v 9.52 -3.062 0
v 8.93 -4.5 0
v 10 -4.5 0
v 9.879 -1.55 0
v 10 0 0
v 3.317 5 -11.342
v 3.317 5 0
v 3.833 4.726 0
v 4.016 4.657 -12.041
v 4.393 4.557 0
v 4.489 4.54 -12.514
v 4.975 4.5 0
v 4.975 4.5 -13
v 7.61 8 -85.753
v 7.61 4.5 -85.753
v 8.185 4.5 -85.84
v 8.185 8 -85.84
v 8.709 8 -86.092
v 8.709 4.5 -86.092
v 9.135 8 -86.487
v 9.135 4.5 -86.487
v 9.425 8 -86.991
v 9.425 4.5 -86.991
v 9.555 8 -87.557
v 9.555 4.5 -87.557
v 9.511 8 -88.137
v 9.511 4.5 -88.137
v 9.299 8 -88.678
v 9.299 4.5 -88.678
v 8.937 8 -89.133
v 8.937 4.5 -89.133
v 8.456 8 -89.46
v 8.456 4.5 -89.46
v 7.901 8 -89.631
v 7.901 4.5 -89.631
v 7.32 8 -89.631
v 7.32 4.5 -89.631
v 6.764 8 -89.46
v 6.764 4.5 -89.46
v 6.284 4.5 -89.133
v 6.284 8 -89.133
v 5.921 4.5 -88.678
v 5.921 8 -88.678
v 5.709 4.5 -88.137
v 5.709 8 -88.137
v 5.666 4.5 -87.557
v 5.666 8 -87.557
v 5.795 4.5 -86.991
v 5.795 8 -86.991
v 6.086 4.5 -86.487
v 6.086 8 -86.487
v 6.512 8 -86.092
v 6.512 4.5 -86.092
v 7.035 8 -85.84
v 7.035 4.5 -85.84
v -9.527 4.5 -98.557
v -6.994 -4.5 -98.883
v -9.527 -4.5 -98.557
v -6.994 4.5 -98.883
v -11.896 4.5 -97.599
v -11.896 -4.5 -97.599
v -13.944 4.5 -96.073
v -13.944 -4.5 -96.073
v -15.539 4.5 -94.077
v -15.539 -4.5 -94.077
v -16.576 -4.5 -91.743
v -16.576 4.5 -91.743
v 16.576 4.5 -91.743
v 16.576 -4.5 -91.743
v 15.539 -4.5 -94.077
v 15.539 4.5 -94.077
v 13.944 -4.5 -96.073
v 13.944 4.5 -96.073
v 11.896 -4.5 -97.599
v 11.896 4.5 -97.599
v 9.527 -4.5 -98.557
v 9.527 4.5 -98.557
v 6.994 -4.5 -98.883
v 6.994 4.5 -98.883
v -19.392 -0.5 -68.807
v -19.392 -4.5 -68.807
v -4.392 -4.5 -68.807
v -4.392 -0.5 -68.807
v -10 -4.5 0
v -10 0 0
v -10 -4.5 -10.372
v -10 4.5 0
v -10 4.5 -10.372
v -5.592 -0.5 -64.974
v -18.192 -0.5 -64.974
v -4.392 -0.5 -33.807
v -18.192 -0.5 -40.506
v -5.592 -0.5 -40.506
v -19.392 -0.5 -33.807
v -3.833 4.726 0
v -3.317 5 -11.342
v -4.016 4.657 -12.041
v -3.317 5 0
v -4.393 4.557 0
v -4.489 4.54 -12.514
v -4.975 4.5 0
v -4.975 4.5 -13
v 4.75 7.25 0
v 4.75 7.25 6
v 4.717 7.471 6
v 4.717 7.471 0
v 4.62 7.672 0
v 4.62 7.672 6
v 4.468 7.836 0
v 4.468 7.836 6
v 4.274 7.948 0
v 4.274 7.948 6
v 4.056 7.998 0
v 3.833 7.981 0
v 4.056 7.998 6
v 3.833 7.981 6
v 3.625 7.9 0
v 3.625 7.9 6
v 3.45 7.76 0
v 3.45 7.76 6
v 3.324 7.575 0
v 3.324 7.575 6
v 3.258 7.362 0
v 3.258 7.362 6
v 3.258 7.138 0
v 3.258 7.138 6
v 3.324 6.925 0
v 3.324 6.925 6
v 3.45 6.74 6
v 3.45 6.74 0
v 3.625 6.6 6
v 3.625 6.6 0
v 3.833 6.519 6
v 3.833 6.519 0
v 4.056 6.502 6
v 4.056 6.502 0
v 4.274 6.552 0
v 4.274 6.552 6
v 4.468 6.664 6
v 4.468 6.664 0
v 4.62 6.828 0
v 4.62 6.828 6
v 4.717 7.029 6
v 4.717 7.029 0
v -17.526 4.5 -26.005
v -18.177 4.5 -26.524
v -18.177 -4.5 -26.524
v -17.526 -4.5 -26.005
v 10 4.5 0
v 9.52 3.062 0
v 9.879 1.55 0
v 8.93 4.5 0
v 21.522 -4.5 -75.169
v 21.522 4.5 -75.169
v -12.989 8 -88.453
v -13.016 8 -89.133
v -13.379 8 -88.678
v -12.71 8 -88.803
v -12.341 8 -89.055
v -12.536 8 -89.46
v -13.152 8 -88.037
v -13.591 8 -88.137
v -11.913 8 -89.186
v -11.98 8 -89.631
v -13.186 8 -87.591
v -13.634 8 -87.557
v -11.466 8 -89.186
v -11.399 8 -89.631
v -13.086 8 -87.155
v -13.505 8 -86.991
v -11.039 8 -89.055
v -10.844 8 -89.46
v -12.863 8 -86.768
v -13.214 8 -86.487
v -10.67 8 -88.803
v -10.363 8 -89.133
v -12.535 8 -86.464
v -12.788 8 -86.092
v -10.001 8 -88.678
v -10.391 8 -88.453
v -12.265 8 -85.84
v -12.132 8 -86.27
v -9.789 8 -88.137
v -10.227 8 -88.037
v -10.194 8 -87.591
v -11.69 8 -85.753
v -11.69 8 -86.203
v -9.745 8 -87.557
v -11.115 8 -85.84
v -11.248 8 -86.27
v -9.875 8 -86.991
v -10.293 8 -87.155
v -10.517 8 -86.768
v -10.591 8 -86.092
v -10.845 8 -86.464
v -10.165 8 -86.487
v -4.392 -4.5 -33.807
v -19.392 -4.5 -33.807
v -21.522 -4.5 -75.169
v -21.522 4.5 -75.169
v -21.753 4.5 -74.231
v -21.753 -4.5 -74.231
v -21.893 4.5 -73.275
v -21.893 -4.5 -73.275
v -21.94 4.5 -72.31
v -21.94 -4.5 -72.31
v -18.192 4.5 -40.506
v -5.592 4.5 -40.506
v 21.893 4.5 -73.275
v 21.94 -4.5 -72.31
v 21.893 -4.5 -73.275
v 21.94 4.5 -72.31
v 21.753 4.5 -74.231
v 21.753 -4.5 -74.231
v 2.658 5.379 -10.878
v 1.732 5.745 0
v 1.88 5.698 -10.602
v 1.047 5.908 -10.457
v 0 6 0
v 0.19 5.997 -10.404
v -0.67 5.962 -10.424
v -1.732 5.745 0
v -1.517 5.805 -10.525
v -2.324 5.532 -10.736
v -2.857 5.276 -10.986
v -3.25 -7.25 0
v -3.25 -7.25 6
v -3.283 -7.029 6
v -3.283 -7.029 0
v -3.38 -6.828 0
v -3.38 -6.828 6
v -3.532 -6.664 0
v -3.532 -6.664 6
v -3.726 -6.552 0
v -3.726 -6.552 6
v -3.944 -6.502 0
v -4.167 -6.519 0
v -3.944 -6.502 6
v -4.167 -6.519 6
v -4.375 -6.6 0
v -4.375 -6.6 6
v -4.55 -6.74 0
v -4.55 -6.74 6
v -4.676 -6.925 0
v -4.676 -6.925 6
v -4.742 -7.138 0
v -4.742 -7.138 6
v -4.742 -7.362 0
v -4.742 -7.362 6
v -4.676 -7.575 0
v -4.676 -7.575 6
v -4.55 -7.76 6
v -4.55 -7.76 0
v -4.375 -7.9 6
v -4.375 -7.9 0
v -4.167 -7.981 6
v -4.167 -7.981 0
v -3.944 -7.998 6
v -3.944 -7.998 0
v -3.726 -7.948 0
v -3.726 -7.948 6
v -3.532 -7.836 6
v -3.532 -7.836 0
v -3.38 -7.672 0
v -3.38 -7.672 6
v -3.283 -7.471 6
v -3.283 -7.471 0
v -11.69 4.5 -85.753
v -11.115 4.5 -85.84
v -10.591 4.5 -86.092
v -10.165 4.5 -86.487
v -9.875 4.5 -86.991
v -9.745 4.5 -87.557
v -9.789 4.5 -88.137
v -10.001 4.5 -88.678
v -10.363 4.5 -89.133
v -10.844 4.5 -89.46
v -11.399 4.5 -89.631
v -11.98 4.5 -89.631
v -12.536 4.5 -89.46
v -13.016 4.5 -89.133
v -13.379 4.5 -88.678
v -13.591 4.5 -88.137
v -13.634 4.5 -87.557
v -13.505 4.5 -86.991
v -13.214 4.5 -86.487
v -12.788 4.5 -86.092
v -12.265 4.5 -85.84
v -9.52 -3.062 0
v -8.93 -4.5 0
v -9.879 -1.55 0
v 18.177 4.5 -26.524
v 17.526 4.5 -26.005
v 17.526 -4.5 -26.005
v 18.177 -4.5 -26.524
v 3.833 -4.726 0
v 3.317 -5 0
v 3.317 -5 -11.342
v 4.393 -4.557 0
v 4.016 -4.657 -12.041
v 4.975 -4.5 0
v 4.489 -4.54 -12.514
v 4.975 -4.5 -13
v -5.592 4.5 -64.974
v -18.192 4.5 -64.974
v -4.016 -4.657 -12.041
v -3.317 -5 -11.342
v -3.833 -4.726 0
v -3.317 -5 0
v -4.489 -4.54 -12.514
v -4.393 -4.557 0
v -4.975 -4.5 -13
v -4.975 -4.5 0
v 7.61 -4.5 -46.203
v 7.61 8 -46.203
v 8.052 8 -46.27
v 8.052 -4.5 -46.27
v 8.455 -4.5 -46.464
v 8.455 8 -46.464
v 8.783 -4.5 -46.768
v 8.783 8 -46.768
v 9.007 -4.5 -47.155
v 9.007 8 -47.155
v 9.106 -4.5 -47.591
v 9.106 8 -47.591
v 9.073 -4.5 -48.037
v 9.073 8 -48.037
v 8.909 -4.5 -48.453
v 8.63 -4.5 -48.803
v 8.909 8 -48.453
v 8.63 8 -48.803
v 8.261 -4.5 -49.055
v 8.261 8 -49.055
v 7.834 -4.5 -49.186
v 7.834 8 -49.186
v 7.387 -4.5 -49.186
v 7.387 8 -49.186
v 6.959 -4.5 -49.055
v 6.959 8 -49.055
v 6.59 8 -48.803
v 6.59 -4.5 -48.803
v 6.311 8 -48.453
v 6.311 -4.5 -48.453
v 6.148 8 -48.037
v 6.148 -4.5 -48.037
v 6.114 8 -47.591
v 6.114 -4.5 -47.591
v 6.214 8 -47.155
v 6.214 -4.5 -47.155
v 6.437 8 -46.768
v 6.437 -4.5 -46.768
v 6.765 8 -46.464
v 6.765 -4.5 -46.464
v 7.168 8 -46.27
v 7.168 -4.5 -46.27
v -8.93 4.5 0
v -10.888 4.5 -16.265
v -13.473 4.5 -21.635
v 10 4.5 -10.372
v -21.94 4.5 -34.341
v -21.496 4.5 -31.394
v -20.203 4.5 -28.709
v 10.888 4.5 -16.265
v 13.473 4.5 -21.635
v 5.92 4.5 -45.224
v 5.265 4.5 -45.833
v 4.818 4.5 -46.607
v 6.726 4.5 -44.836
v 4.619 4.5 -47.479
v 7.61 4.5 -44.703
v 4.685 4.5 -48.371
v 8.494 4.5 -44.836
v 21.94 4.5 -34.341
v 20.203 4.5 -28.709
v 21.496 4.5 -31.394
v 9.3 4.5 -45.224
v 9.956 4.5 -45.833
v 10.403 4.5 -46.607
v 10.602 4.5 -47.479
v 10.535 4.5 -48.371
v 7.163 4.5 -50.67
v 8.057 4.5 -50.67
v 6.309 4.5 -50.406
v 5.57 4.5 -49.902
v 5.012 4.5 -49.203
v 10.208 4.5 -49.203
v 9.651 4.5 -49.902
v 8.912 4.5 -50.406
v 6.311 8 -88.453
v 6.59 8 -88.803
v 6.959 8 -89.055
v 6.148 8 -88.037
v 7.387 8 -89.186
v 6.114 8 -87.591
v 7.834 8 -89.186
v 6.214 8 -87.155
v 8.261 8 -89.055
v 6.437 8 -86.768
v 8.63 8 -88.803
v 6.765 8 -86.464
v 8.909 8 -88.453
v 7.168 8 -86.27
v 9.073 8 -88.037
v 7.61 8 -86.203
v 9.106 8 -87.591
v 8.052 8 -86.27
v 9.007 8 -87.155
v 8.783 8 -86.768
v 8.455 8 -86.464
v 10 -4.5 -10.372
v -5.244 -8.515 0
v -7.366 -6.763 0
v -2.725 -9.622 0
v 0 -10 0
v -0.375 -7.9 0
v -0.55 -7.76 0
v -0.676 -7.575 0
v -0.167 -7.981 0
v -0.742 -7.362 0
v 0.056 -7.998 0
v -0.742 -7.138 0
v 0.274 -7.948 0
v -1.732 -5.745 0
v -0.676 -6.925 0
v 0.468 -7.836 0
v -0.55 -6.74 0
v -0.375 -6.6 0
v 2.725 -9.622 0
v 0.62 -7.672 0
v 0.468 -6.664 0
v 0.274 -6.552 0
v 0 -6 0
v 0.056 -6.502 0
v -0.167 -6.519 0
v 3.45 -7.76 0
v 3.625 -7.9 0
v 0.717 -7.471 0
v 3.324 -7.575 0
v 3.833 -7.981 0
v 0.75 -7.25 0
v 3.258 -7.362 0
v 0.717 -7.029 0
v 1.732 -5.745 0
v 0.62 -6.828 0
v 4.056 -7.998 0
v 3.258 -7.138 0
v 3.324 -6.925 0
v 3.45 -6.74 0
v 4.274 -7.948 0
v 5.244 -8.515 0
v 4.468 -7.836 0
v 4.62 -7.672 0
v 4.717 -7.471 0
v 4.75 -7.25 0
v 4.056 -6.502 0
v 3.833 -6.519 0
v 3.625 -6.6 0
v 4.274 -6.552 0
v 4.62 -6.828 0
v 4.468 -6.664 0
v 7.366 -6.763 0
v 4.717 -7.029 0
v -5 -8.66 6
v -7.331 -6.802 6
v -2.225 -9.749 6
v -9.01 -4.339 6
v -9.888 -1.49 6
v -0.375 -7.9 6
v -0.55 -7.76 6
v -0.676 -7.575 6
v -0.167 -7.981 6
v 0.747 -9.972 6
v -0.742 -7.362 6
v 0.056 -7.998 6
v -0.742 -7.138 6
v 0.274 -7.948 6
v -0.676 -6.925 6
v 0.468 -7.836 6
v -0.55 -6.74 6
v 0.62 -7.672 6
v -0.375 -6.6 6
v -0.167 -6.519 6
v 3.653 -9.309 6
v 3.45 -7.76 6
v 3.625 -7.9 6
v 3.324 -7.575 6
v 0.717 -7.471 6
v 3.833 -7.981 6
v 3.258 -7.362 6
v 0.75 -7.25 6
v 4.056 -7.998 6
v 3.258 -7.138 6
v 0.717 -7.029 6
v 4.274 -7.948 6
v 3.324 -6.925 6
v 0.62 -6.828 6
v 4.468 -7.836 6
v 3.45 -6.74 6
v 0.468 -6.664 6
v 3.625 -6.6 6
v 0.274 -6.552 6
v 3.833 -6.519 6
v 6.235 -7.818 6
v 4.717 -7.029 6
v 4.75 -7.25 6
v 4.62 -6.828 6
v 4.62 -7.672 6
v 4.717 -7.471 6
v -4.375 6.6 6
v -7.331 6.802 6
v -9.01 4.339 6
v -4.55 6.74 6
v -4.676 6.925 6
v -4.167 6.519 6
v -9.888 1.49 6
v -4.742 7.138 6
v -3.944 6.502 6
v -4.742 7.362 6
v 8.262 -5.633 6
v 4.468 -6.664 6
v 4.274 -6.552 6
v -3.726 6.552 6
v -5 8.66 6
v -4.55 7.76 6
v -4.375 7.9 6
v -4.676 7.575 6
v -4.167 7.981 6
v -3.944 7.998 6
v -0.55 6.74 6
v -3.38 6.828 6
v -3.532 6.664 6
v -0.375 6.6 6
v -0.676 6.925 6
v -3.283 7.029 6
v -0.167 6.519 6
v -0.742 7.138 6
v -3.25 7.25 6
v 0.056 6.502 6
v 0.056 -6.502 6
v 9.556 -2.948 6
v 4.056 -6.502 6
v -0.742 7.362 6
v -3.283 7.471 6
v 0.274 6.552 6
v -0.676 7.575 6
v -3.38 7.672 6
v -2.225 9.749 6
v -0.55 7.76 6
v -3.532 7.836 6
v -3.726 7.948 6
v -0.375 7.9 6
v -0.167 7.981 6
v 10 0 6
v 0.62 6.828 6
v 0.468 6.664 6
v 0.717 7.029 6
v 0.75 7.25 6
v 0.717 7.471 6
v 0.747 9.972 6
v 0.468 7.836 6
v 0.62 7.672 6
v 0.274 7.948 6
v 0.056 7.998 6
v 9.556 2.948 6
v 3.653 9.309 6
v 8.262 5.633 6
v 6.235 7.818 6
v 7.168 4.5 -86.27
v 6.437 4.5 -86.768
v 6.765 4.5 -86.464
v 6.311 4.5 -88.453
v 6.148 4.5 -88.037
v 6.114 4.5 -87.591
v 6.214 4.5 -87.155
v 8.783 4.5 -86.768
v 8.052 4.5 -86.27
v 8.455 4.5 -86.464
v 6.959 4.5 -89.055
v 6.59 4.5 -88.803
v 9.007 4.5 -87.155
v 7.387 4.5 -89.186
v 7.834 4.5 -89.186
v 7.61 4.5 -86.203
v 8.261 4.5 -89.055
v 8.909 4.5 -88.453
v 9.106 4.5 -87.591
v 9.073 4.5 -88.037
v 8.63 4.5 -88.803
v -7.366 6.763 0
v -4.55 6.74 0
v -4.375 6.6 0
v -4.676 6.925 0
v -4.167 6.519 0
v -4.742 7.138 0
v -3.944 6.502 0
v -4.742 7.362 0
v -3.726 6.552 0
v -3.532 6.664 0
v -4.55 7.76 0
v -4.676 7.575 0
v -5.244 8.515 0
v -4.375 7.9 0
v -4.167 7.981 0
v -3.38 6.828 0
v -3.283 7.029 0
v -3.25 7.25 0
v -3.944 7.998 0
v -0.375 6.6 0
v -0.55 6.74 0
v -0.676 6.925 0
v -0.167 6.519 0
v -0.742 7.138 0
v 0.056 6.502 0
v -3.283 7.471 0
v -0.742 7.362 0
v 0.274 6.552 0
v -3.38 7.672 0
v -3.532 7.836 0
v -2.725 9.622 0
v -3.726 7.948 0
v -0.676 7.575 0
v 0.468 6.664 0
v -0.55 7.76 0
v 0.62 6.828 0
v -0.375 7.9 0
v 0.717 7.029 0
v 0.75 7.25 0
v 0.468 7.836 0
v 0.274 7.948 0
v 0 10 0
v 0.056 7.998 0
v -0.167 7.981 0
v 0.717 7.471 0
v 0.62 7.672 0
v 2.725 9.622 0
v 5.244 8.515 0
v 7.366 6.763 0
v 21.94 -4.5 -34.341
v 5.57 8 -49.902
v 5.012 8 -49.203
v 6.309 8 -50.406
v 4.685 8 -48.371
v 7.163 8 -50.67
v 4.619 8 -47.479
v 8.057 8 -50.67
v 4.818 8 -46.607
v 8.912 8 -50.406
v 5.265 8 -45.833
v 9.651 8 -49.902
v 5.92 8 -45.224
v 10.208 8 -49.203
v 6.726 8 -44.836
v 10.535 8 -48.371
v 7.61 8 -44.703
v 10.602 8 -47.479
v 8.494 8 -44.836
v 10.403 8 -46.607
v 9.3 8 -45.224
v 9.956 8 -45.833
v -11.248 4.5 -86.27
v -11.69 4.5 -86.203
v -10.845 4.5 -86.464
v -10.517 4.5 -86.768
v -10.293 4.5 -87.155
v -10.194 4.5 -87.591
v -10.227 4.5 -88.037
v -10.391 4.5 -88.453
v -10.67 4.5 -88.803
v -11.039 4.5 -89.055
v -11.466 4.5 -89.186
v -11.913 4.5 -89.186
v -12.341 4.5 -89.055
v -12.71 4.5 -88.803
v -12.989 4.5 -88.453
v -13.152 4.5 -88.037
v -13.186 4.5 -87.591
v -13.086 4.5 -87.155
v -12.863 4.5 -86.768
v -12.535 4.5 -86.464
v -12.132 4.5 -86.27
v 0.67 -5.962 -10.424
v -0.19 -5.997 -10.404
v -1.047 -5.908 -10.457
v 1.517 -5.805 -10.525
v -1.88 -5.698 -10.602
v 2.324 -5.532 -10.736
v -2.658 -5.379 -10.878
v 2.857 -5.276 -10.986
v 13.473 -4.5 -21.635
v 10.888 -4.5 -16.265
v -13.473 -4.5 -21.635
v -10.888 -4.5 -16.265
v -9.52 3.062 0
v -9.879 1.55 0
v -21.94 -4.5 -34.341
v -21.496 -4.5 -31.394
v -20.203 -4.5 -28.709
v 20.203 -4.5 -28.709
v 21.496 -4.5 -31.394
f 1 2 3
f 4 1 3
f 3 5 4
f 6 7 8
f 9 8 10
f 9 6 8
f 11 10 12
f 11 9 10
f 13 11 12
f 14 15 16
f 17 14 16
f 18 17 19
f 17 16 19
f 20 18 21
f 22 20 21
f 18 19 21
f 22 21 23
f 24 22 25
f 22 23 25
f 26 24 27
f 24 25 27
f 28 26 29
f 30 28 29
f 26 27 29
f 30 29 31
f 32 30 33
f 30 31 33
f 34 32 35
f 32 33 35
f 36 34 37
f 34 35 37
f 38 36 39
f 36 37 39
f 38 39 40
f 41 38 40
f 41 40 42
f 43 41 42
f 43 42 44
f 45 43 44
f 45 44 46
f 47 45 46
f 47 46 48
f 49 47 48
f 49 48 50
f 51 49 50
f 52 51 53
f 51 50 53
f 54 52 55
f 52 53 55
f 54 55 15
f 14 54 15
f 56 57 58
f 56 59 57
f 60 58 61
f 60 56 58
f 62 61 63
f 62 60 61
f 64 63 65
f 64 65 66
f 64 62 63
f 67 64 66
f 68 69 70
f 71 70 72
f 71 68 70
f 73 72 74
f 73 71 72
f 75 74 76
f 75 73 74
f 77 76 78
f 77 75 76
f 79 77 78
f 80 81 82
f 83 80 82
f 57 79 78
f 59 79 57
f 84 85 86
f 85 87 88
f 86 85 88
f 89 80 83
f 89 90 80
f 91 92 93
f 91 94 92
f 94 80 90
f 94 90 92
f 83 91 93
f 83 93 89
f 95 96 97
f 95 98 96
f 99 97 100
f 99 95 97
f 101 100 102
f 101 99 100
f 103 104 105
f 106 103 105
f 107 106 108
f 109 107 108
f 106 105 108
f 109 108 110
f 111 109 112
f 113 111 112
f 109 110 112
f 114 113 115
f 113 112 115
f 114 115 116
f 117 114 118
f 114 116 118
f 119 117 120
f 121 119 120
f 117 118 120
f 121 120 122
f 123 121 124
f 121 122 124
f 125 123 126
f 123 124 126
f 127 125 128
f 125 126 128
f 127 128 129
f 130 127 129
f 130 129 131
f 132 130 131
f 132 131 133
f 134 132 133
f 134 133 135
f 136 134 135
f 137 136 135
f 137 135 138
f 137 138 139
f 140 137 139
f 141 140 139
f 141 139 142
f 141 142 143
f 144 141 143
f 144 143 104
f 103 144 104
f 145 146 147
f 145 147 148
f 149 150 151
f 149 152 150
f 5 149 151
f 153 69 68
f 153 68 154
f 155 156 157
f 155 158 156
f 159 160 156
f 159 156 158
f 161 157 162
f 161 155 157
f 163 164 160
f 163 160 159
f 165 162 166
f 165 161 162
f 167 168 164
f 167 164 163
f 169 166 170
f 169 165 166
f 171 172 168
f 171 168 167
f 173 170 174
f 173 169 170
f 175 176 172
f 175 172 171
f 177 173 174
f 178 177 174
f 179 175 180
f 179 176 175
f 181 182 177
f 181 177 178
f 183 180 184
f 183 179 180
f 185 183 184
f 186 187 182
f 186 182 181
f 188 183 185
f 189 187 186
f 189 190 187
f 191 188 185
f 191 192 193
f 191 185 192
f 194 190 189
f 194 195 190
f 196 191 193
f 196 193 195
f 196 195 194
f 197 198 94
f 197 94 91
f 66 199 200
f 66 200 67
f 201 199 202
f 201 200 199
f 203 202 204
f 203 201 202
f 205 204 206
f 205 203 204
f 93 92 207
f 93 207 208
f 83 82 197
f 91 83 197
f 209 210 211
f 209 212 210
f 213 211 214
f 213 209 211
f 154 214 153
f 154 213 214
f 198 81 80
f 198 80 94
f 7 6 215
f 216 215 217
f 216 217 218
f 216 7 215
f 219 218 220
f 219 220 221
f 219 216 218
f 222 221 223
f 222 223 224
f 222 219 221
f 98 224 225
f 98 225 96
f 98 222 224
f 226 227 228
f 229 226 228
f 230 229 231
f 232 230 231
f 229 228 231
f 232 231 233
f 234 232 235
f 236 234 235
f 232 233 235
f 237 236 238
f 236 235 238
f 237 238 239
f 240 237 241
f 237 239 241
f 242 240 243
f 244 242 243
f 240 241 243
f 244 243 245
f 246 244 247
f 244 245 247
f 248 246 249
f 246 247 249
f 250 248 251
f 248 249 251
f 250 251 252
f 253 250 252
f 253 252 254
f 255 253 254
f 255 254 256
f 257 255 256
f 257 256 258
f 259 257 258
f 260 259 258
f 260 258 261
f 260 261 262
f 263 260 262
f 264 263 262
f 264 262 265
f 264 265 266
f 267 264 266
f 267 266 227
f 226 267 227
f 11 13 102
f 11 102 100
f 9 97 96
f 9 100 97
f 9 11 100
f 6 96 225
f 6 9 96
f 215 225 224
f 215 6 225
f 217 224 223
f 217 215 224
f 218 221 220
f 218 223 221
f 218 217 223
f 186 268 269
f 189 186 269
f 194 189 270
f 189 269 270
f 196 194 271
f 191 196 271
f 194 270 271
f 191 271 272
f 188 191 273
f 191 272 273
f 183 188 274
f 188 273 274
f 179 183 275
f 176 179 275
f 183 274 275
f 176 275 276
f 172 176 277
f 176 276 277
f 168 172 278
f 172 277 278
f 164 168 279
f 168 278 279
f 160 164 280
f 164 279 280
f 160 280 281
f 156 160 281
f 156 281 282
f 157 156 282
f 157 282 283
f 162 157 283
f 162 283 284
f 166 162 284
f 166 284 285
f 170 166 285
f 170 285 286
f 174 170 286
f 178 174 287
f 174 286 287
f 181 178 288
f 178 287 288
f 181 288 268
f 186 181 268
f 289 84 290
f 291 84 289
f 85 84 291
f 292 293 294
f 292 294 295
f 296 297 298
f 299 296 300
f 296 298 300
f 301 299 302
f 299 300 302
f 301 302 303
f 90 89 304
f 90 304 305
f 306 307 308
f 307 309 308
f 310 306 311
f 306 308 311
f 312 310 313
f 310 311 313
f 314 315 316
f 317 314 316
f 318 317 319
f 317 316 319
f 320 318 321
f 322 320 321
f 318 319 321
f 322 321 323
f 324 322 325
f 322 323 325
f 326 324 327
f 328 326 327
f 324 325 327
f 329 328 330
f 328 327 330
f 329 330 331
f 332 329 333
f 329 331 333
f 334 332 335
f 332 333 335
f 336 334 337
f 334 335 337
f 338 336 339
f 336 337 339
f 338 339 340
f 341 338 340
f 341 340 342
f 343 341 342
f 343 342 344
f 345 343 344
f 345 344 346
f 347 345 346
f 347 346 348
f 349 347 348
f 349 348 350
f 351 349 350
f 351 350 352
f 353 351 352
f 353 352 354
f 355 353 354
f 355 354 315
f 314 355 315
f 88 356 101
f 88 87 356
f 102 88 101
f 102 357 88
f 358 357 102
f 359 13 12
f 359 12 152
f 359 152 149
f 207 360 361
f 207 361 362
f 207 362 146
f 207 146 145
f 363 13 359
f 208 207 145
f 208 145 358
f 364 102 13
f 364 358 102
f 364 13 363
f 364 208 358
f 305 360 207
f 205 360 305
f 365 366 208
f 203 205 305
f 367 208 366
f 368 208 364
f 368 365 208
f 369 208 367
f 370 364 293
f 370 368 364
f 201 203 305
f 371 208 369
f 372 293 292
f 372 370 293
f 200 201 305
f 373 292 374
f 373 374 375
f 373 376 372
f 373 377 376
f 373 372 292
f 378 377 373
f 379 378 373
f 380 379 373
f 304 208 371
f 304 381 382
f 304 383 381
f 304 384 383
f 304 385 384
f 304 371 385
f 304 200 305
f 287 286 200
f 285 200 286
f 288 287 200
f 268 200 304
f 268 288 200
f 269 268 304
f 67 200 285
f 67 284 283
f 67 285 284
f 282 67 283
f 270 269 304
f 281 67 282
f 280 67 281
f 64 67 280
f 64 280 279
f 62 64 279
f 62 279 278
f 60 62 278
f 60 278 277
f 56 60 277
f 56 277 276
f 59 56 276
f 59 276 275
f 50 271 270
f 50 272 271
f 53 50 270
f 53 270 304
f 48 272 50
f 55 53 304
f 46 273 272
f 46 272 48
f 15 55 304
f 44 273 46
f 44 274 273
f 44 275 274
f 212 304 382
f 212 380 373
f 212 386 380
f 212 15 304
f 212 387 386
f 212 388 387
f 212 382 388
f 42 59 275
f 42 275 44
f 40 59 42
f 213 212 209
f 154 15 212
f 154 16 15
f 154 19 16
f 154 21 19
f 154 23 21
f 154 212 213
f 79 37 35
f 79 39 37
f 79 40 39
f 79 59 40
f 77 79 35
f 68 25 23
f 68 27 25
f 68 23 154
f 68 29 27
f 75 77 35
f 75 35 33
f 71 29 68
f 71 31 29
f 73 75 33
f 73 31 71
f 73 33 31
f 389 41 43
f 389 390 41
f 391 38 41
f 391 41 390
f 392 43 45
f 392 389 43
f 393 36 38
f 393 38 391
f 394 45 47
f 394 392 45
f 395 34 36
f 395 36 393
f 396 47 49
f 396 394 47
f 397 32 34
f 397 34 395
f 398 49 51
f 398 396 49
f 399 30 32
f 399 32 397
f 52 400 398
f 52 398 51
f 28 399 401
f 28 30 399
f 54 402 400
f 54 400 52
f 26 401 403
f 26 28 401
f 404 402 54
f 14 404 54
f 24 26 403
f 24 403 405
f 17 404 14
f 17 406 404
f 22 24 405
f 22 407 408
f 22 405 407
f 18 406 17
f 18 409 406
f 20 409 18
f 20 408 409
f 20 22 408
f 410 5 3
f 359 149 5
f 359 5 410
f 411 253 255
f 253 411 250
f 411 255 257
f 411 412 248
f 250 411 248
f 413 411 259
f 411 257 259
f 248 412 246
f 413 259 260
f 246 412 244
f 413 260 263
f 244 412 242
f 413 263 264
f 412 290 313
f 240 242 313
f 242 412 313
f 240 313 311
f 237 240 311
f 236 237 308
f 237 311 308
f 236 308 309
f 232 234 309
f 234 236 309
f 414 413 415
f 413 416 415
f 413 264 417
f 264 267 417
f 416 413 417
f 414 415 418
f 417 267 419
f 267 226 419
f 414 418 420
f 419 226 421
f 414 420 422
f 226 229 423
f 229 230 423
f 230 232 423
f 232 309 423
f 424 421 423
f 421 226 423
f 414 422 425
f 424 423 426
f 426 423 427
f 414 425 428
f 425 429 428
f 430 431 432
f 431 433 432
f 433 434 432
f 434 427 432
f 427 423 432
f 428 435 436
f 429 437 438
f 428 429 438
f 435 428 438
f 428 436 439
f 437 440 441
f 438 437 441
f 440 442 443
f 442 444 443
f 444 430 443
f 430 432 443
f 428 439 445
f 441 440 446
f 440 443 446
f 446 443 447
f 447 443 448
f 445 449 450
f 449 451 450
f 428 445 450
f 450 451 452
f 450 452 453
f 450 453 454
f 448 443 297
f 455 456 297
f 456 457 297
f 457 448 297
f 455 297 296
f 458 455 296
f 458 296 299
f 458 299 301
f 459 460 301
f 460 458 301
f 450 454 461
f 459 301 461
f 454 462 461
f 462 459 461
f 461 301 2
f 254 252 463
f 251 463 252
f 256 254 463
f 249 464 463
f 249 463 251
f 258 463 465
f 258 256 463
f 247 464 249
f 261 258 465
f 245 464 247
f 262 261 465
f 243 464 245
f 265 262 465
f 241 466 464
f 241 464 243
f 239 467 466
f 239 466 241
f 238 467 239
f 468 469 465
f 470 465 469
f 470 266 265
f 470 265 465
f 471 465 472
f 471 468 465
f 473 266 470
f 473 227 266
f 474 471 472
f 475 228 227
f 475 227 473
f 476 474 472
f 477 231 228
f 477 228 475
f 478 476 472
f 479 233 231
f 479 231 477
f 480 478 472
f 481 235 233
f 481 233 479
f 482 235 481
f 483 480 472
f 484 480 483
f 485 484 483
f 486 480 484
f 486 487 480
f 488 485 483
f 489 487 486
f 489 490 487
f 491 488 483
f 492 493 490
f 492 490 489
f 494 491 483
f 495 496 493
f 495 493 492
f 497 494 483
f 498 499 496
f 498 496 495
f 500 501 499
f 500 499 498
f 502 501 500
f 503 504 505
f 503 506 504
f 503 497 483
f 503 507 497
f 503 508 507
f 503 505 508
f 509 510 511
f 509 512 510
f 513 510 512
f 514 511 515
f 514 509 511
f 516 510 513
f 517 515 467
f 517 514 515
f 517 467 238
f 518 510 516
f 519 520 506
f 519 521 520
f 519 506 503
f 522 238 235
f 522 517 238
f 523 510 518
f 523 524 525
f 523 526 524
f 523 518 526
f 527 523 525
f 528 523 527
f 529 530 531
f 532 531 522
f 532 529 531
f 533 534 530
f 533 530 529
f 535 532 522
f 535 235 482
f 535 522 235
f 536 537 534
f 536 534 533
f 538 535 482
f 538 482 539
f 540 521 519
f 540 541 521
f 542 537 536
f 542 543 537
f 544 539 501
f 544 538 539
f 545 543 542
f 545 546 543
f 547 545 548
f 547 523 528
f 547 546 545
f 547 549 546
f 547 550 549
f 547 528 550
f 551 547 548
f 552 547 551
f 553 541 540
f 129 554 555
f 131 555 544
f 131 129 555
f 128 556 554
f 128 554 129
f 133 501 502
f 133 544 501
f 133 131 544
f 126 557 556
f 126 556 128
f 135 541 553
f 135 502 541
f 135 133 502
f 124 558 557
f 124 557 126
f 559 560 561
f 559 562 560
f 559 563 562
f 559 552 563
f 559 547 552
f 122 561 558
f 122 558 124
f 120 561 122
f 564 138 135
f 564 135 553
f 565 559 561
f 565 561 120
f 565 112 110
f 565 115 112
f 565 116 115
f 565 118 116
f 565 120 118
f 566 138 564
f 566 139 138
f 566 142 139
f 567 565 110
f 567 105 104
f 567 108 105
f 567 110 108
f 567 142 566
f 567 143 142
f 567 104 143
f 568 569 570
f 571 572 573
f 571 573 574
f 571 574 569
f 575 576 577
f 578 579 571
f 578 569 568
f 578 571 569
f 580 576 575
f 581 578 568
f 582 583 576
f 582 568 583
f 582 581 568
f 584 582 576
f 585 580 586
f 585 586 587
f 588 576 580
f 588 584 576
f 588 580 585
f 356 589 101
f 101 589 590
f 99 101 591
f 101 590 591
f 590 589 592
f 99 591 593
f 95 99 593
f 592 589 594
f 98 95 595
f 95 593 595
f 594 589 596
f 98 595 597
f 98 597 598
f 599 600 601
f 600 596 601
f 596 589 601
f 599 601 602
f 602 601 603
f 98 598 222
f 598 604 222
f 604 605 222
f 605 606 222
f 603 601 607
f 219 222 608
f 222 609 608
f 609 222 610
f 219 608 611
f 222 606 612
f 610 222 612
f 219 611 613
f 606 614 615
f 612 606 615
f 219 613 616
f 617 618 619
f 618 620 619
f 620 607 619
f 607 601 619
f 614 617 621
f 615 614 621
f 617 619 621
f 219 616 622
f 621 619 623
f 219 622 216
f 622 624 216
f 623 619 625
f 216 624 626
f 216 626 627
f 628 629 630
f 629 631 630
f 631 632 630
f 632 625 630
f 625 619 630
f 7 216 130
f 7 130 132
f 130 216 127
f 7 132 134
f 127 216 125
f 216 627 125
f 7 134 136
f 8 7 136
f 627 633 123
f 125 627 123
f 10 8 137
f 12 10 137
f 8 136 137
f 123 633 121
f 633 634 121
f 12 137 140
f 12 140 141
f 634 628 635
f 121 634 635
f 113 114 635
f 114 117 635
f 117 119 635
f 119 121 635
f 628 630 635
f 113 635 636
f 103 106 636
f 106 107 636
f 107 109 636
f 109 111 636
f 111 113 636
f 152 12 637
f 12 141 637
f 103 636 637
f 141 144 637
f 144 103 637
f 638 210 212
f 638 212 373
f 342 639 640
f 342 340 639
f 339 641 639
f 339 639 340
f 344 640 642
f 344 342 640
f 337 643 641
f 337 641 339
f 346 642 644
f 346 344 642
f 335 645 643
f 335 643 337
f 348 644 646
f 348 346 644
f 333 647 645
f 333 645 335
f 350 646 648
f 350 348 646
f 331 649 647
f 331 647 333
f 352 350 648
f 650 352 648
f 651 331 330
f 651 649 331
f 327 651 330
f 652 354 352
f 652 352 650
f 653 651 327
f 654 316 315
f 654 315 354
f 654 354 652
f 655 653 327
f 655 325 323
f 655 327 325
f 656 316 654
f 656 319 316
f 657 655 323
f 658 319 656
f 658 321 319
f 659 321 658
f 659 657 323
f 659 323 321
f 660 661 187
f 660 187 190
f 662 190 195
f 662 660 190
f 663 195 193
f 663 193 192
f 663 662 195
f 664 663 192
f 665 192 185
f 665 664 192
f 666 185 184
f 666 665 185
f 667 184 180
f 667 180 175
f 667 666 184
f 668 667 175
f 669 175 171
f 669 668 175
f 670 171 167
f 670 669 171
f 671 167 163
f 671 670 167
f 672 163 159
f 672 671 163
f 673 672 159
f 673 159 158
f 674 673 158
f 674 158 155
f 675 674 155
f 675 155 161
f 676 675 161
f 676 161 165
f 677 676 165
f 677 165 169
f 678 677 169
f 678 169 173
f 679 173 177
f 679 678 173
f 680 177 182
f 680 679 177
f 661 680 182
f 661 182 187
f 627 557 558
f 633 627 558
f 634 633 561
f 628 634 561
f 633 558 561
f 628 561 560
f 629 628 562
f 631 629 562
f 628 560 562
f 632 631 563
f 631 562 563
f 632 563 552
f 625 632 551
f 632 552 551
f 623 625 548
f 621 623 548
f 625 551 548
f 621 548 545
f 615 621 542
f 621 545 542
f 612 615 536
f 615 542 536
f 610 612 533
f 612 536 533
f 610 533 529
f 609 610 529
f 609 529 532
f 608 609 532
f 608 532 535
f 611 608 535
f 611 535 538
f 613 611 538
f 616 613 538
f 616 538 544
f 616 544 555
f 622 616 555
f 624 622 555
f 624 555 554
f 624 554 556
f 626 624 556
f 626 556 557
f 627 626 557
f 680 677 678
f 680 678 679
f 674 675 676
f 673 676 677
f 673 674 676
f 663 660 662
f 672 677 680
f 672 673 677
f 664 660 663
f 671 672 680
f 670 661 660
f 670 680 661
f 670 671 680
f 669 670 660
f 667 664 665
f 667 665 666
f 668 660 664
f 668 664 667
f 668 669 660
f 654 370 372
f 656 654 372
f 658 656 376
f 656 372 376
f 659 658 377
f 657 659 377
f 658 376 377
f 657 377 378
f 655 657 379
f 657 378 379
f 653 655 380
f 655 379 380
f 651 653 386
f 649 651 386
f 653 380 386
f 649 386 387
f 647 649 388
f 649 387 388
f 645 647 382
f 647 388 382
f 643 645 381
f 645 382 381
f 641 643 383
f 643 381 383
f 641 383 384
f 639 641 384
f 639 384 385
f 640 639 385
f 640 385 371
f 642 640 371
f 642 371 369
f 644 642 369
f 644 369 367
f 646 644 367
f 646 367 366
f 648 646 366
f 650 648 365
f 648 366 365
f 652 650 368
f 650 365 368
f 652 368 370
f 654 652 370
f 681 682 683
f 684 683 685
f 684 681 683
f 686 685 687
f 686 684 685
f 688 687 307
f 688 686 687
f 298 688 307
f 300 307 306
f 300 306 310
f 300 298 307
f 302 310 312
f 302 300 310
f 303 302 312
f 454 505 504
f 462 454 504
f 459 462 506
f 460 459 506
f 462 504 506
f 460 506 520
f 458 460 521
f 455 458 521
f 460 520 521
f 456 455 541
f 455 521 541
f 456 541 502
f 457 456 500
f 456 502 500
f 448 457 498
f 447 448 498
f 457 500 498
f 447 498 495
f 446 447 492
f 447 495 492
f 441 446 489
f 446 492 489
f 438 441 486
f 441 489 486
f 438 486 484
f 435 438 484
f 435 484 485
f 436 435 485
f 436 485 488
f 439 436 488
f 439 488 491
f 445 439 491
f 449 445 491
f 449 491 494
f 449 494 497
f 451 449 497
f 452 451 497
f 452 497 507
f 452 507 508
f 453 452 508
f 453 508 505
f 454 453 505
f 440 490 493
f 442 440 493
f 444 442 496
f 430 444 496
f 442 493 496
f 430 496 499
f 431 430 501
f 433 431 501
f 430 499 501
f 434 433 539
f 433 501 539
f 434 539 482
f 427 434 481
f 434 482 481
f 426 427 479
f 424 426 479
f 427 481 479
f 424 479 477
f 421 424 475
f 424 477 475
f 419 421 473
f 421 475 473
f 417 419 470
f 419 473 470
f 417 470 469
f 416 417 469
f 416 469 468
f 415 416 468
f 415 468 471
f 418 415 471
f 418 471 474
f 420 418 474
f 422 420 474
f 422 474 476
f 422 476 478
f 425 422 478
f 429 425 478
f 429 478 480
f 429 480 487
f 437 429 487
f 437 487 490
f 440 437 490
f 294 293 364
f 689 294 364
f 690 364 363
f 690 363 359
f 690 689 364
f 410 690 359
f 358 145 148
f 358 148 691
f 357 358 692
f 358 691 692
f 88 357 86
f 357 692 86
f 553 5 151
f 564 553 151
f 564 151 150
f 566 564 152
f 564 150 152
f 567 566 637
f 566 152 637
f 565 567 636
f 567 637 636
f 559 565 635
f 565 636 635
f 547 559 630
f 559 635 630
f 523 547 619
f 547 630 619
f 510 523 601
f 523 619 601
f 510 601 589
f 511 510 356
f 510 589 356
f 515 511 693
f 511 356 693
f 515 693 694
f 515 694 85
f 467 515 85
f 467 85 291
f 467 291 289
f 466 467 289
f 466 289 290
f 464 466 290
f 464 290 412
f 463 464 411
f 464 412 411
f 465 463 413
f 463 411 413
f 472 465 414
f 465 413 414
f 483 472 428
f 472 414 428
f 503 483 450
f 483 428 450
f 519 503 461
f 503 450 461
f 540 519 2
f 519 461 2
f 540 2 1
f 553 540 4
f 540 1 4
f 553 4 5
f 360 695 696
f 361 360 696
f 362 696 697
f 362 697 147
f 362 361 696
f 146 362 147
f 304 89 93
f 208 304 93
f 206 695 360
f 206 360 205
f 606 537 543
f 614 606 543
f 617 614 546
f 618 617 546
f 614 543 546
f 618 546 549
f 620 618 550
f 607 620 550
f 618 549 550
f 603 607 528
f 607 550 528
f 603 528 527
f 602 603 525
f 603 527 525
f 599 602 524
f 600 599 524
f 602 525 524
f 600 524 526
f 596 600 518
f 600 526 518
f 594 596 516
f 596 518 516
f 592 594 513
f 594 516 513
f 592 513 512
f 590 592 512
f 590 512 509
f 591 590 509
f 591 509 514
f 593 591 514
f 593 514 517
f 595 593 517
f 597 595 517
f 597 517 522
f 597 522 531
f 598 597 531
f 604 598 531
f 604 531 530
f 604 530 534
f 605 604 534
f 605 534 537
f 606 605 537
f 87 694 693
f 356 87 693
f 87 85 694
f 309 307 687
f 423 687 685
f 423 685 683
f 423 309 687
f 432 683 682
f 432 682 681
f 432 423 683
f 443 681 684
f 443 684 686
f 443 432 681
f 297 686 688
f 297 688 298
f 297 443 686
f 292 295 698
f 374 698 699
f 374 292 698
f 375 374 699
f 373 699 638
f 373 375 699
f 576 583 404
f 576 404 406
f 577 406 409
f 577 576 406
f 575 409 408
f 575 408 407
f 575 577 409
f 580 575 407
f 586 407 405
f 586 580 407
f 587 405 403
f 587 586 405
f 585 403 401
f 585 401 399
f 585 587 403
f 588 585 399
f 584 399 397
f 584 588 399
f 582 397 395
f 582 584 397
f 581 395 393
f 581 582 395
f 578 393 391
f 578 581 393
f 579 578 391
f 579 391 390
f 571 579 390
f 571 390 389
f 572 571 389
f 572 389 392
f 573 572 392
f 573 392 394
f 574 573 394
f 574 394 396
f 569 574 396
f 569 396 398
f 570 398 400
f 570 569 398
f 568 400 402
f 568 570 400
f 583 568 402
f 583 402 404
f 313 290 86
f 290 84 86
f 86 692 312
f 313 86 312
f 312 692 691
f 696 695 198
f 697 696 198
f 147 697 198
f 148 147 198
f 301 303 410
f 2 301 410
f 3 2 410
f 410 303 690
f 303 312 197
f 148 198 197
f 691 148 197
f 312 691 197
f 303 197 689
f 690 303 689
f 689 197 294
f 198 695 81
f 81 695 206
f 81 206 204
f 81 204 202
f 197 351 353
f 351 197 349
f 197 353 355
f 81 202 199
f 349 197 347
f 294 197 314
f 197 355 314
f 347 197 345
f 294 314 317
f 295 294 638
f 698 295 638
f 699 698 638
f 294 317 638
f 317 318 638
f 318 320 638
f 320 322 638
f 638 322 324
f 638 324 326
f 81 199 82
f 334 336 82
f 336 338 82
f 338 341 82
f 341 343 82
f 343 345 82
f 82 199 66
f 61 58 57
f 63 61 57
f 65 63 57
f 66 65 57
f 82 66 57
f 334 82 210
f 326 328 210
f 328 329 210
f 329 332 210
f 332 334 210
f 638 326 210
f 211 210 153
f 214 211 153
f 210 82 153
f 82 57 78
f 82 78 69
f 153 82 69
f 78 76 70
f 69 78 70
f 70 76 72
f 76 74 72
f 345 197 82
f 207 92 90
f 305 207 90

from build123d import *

# Parameters (mm, degrees)
SKETCH1_R           = 10
BOSS_EXTRUDE1_DEPTH = 6
SKETCH2_R           = 0.75
CUT_EXTRUDE1_DEPTH  = 15
SKETCH4_R           = 6
BOSS_EXTRUDE3_DEPTH = 10
SKETCH5_W           = 20
SKETCH5_H           = 20
BOSS_EXTRUDE4_DEPTH = 4.5
BOSS_EXTRUDE5_DEPTH = 9
SKETCH7_W           = 15
SKETCH7_H           = 35
CUT_EXTRUDE2_DEPTH  = 4
CUT_EXTRUDE3_DEPTH  = 14
CUT_EXTRUDE4_DEPTH  = 10
SKETCH11_R          = 1.95
SKETCH11_R_2        = 1.5
BOSS_EXTRUDE6_DEPTH = 3.5
SKETCH12_R          = 3
BOSS_EXTRUDE7_DEPTH = 3.5
SKETCH13_R          = 1.5
CUT_EXTRUDE5_DEPTH  = 25
FILLET1_R           = 20
FILLET2_R           = 10
FILLET3_R           = 3
FILLET4_R           = 3
FILLET5_R           = 3
FILLET6_R           = 3


with BuildPart() as part:
    # Sketch1 → Boss-Extrude1 (new body)
    with BuildSketch(Plane.XY):
        Circle(SKETCH1_R)
    extrude(amount=BOSS_EXTRUDE1_DEPTH)

    # Sketch2 → Cut-Extrude1 (cut)
    with BuildSketch(Plane.XY.offset(6)):
        with Locations((0, 7.25)):
            Circle(SKETCH2_R)
        with Locations((4, 7.25)):
            Circle(SKETCH2_R)
        with Locations((-4, 7.25)):
            Circle(SKETCH2_R)
        with Locations((4, -7.25)):
            Circle(SKETCH2_R)
        with Locations((0, -7.25)):
            Circle(SKETCH2_R)
        with Locations((-4, -7.25)):
            Circle(SKETCH2_R)
    extrude(amount=-CUT_EXTRUDE1_DEPTH, mode=Mode.SUBTRACT)

    # Sketch4 → Boss-Extrude3 (add)
    with BuildSketch(Plane(origin=(0, 0, 0), x_dir=(-1, 0, 0), z_dir=(0, 0, -1))):
        Circle(SKETCH4_R)
    extrude(amount=BOSS_EXTRUDE3_DEPTH)

    # Sketch5 → Boss-Extrude4 (add, symmetric)
    with BuildSketch(Plane(origin=(0, 0, 0), x_dir=(1, 0, 0), z_dir=(0, 1, 0))):
        with Locations((0, 10)):
            Rectangle(SKETCH5_W, SKETCH5_H)
    extrude(amount=BOSS_EXTRUDE4_DEPTH, both=True)

    # Sketch6 → Boss-Extrude5 (add)
    with BuildSketch(Plane(origin=(0, 4.5, 0), x_dir=(1, 0, 0), z_dir=(0, 1, 0))):
        Polygon((10, 20), (35.763212592, 40.556396064), (35.763212592, 98.883063355), (-35.763212592, 98.883063355), (-35.763212592, 40.556396064), (-10, 20), align=None)
    extrude(amount=-BOSS_EXTRUDE5_DEPTH)

    # Sketch7 → Cut-Extrude2 (cut)
    with BuildSketch(Plane.XZ.offset(4.5)):
        with Locations((-11.892304399, -51.30711123)):
            Rectangle(SKETCH7_W, SKETCH7_H)
    extrude(amount=-CUT_EXTRUDE2_DEPTH, mode=Mode.SUBTRACT)

    # Sketch8 → Cut-Extrude3 (cut)
    with BuildSketch(Plane.XZ.offset(0.5)):
        Polygon((-18.192304399, -55.774359721), (-18.192304399, -40.505749007), (-5.592304399, -40.505749007), (-5.592304399, -55.774359721), (-5.592304399, -64.974058921), (-18.192304399, -64.974058921), align=None)
    extrude(amount=-CUT_EXTRUDE3_DEPTH, mode=Mode.SUBTRACT)

    # Sketch10 → Cut-Extrude4 (cut)
    with BuildSketch(Plane.XZ.offset(4.5)):
        Polygon((-21.939786422, -73.769938093), (-14.445366372, -98.883063355), (-35.763212592, -98.883063355), (-35.763212592, -40.556396064), (-21.939786422, -29.526722559), align=None)
        Polygon((35.763212592, -40.556396064), (35.763212592, -98.883063355), (14.445366372, -98.883063355), (21.939786422, -73.769938093), (21.939786422, -29.526722559), align=None)
    extrude(amount=-CUT_EXTRUDE4_DEPTH, mode=Mode.SUBTRACT)

    # Sketch11 → Boss-Extrude6 (add)
    # profile 1 of 2: a face of its own
    with BuildSketch(Plane(origin=(0, 4.5, 0), x_dir=(1, 0, 0), z_dir=(0, 1, 0))):
        with Locations(Location((-11.689786422, 87.703063355, 0), (0, 0, 270))):
            Circle(SKETCH11_R)
        with Locations(Location((-11.689786422, 87.703063355, 0), (0, 0, 270))):
            Circle(SKETCH11_R_2, mode=Mode.SUBTRACT)
    # profile 2 of 2: a face of its own
    with BuildSketch(Plane(origin=(0, 4.5, 0), x_dir=(1, 0, 0), z_dir=(0, 1, 0))):
        with Locations(Location((7.610213578, 87.703063355, 0), (0, 0, 270))):
            Circle(SKETCH11_R)
        with Locations(Location((7.610213578, 87.703063355, 0), (0, 0, 270))):
            Circle(SKETCH11_R_2, mode=Mode.SUBTRACT)
    extrude(amount=BOSS_EXTRUDE6_DEPTH)

    # Sketch12 → Boss-Extrude7 (add)
    with BuildSketch(Plane(origin=(0, 4.5, 0), x_dir=(1, 0, 0), z_dir=(0, 1, 0))):
        with Locations(Location((7.610213578, 47.703063355, 0), (0, 0, 270))):
            Circle(SKETCH12_R)
    extrude(amount=BOSS_EXTRUDE7_DEPTH)

    # Sketch13 → Cut-Extrude5 (cut)
    with BuildSketch(Plane(origin=(0, 8, 0), x_dir=(1, 0, 0), z_dir=(0, 1, 0))):
        with Locations(Location((7.610213578, 47.703063355, 0), (0, 0, 270))):
            Circle(SKETCH13_R)
    extrude(amount=-CUT_EXTRUDE5_DEPTH, mode=Mode.SUBTRACT)

    # Fillet1
    fillet1_edges = [part.edges().sort_by_distance(p)[0] for p in [
        (10, 0, -20),
        (-10, 0, -20),
    ]]
    fillet(fillet1_edges, radius=FILLET1_R)

    # Fillet2
    fillet2_edges = [part.edges().sort_by_distance(p)[0] for p in [
        (-21.939786422, 0, -29.526722559),
        (-21.939786422, 0, -73.769938093),
        (-14.445366372, 0, -98.883063355),
        (21.939786422, 0, -29.526722559),
        (14.445366372, 0, -98.883063355),
        (21.939786422, 0, -73.769938093),
    ]]
    fillet(fillet2_edges, radius=FILLET2_R)

    # Fillet3
    # the kernel refuses this fillet: 3 mm, written as the material it adds along each edge
    with BuildSketch(Plane(origin=(11.468626967, 4.5, -10), x_dir=(0, 0, -1), z_dir=(-1, 0, 0))) as fillet3_piece_1_section:
        with BuildLine():
            CenterArc((FILLET3_R, -FILLET3_R), FILLET3_R, 90, 90)
            Line((0, -FILLET3_R), (0, 0))
            Line((0, 0), (FILLET3_R, 0))
        make_face()
    fillet3_piece_1 = extrude(amount=22.937253933, mode=Mode.PRIVATE)
    fillet3_piece_1 = fillet3_piece_1 & Plane(origin=(0, 0, -10.801783603), x_dir=(-1, 0, 0), z_dir=(0, 0, 1)) * Cylinder(6, 58, mode=Mode.PRIVATE)
    add(fillet3_piece_1)
    with BuildSketch(Plane(origin=(11.468626967, -4.5, -10), x_dir=(0, 0, -1), z_dir=(-1, 0, 0))) as fillet3_piece_2_section:
        with BuildLine():
            CenterArc((FILLET3_R, FILLET3_R), FILLET3_R, 180, 90)
            Line((0, FILLET3_R), (0, 0))
            Line((0, 0), (FILLET3_R, 0))
        make_face()
    fillet3_piece_2 = extrude(amount=22.937253933, mode=Mode.PRIVATE)
    fillet3_piece_2 = fillet3_piece_2 & Plane(origin=(0, 0, -10.801783603), x_dir=(-1, 0, 0), z_dir=(0, 0, 1)) * Cylinder(6, 58, mode=Mode.PRIVATE)
    add(fillet3_piece_2)

    # Fillet4
    fillet4_edges = [part.edges().sort_by_distance(p)[0] for p in [
        (3.968626967, 4.5, -6.5),
    ]]
    fillet(fillet4_edges, radius=FILLET4_R)

    # Fillet5
    fillet5_edges = [part.edges().sort_by_distance(p)[0] for p in [
        (-3.968626967, 4.5, -6.5),
    ]]
    fillet(fillet5_edges, radius=FILLET5_R)

    # Fillet6
    fillet6_edges = [part.edges().sort_by_distance(p)[0] for p in [
        (-3.968626967, -4.5, -6.5),
        (3.968626967, -4.5, -6.5),
    ]]
    fillet(fillet6_edges, radius=FILLET6_R)


solid = part.part
